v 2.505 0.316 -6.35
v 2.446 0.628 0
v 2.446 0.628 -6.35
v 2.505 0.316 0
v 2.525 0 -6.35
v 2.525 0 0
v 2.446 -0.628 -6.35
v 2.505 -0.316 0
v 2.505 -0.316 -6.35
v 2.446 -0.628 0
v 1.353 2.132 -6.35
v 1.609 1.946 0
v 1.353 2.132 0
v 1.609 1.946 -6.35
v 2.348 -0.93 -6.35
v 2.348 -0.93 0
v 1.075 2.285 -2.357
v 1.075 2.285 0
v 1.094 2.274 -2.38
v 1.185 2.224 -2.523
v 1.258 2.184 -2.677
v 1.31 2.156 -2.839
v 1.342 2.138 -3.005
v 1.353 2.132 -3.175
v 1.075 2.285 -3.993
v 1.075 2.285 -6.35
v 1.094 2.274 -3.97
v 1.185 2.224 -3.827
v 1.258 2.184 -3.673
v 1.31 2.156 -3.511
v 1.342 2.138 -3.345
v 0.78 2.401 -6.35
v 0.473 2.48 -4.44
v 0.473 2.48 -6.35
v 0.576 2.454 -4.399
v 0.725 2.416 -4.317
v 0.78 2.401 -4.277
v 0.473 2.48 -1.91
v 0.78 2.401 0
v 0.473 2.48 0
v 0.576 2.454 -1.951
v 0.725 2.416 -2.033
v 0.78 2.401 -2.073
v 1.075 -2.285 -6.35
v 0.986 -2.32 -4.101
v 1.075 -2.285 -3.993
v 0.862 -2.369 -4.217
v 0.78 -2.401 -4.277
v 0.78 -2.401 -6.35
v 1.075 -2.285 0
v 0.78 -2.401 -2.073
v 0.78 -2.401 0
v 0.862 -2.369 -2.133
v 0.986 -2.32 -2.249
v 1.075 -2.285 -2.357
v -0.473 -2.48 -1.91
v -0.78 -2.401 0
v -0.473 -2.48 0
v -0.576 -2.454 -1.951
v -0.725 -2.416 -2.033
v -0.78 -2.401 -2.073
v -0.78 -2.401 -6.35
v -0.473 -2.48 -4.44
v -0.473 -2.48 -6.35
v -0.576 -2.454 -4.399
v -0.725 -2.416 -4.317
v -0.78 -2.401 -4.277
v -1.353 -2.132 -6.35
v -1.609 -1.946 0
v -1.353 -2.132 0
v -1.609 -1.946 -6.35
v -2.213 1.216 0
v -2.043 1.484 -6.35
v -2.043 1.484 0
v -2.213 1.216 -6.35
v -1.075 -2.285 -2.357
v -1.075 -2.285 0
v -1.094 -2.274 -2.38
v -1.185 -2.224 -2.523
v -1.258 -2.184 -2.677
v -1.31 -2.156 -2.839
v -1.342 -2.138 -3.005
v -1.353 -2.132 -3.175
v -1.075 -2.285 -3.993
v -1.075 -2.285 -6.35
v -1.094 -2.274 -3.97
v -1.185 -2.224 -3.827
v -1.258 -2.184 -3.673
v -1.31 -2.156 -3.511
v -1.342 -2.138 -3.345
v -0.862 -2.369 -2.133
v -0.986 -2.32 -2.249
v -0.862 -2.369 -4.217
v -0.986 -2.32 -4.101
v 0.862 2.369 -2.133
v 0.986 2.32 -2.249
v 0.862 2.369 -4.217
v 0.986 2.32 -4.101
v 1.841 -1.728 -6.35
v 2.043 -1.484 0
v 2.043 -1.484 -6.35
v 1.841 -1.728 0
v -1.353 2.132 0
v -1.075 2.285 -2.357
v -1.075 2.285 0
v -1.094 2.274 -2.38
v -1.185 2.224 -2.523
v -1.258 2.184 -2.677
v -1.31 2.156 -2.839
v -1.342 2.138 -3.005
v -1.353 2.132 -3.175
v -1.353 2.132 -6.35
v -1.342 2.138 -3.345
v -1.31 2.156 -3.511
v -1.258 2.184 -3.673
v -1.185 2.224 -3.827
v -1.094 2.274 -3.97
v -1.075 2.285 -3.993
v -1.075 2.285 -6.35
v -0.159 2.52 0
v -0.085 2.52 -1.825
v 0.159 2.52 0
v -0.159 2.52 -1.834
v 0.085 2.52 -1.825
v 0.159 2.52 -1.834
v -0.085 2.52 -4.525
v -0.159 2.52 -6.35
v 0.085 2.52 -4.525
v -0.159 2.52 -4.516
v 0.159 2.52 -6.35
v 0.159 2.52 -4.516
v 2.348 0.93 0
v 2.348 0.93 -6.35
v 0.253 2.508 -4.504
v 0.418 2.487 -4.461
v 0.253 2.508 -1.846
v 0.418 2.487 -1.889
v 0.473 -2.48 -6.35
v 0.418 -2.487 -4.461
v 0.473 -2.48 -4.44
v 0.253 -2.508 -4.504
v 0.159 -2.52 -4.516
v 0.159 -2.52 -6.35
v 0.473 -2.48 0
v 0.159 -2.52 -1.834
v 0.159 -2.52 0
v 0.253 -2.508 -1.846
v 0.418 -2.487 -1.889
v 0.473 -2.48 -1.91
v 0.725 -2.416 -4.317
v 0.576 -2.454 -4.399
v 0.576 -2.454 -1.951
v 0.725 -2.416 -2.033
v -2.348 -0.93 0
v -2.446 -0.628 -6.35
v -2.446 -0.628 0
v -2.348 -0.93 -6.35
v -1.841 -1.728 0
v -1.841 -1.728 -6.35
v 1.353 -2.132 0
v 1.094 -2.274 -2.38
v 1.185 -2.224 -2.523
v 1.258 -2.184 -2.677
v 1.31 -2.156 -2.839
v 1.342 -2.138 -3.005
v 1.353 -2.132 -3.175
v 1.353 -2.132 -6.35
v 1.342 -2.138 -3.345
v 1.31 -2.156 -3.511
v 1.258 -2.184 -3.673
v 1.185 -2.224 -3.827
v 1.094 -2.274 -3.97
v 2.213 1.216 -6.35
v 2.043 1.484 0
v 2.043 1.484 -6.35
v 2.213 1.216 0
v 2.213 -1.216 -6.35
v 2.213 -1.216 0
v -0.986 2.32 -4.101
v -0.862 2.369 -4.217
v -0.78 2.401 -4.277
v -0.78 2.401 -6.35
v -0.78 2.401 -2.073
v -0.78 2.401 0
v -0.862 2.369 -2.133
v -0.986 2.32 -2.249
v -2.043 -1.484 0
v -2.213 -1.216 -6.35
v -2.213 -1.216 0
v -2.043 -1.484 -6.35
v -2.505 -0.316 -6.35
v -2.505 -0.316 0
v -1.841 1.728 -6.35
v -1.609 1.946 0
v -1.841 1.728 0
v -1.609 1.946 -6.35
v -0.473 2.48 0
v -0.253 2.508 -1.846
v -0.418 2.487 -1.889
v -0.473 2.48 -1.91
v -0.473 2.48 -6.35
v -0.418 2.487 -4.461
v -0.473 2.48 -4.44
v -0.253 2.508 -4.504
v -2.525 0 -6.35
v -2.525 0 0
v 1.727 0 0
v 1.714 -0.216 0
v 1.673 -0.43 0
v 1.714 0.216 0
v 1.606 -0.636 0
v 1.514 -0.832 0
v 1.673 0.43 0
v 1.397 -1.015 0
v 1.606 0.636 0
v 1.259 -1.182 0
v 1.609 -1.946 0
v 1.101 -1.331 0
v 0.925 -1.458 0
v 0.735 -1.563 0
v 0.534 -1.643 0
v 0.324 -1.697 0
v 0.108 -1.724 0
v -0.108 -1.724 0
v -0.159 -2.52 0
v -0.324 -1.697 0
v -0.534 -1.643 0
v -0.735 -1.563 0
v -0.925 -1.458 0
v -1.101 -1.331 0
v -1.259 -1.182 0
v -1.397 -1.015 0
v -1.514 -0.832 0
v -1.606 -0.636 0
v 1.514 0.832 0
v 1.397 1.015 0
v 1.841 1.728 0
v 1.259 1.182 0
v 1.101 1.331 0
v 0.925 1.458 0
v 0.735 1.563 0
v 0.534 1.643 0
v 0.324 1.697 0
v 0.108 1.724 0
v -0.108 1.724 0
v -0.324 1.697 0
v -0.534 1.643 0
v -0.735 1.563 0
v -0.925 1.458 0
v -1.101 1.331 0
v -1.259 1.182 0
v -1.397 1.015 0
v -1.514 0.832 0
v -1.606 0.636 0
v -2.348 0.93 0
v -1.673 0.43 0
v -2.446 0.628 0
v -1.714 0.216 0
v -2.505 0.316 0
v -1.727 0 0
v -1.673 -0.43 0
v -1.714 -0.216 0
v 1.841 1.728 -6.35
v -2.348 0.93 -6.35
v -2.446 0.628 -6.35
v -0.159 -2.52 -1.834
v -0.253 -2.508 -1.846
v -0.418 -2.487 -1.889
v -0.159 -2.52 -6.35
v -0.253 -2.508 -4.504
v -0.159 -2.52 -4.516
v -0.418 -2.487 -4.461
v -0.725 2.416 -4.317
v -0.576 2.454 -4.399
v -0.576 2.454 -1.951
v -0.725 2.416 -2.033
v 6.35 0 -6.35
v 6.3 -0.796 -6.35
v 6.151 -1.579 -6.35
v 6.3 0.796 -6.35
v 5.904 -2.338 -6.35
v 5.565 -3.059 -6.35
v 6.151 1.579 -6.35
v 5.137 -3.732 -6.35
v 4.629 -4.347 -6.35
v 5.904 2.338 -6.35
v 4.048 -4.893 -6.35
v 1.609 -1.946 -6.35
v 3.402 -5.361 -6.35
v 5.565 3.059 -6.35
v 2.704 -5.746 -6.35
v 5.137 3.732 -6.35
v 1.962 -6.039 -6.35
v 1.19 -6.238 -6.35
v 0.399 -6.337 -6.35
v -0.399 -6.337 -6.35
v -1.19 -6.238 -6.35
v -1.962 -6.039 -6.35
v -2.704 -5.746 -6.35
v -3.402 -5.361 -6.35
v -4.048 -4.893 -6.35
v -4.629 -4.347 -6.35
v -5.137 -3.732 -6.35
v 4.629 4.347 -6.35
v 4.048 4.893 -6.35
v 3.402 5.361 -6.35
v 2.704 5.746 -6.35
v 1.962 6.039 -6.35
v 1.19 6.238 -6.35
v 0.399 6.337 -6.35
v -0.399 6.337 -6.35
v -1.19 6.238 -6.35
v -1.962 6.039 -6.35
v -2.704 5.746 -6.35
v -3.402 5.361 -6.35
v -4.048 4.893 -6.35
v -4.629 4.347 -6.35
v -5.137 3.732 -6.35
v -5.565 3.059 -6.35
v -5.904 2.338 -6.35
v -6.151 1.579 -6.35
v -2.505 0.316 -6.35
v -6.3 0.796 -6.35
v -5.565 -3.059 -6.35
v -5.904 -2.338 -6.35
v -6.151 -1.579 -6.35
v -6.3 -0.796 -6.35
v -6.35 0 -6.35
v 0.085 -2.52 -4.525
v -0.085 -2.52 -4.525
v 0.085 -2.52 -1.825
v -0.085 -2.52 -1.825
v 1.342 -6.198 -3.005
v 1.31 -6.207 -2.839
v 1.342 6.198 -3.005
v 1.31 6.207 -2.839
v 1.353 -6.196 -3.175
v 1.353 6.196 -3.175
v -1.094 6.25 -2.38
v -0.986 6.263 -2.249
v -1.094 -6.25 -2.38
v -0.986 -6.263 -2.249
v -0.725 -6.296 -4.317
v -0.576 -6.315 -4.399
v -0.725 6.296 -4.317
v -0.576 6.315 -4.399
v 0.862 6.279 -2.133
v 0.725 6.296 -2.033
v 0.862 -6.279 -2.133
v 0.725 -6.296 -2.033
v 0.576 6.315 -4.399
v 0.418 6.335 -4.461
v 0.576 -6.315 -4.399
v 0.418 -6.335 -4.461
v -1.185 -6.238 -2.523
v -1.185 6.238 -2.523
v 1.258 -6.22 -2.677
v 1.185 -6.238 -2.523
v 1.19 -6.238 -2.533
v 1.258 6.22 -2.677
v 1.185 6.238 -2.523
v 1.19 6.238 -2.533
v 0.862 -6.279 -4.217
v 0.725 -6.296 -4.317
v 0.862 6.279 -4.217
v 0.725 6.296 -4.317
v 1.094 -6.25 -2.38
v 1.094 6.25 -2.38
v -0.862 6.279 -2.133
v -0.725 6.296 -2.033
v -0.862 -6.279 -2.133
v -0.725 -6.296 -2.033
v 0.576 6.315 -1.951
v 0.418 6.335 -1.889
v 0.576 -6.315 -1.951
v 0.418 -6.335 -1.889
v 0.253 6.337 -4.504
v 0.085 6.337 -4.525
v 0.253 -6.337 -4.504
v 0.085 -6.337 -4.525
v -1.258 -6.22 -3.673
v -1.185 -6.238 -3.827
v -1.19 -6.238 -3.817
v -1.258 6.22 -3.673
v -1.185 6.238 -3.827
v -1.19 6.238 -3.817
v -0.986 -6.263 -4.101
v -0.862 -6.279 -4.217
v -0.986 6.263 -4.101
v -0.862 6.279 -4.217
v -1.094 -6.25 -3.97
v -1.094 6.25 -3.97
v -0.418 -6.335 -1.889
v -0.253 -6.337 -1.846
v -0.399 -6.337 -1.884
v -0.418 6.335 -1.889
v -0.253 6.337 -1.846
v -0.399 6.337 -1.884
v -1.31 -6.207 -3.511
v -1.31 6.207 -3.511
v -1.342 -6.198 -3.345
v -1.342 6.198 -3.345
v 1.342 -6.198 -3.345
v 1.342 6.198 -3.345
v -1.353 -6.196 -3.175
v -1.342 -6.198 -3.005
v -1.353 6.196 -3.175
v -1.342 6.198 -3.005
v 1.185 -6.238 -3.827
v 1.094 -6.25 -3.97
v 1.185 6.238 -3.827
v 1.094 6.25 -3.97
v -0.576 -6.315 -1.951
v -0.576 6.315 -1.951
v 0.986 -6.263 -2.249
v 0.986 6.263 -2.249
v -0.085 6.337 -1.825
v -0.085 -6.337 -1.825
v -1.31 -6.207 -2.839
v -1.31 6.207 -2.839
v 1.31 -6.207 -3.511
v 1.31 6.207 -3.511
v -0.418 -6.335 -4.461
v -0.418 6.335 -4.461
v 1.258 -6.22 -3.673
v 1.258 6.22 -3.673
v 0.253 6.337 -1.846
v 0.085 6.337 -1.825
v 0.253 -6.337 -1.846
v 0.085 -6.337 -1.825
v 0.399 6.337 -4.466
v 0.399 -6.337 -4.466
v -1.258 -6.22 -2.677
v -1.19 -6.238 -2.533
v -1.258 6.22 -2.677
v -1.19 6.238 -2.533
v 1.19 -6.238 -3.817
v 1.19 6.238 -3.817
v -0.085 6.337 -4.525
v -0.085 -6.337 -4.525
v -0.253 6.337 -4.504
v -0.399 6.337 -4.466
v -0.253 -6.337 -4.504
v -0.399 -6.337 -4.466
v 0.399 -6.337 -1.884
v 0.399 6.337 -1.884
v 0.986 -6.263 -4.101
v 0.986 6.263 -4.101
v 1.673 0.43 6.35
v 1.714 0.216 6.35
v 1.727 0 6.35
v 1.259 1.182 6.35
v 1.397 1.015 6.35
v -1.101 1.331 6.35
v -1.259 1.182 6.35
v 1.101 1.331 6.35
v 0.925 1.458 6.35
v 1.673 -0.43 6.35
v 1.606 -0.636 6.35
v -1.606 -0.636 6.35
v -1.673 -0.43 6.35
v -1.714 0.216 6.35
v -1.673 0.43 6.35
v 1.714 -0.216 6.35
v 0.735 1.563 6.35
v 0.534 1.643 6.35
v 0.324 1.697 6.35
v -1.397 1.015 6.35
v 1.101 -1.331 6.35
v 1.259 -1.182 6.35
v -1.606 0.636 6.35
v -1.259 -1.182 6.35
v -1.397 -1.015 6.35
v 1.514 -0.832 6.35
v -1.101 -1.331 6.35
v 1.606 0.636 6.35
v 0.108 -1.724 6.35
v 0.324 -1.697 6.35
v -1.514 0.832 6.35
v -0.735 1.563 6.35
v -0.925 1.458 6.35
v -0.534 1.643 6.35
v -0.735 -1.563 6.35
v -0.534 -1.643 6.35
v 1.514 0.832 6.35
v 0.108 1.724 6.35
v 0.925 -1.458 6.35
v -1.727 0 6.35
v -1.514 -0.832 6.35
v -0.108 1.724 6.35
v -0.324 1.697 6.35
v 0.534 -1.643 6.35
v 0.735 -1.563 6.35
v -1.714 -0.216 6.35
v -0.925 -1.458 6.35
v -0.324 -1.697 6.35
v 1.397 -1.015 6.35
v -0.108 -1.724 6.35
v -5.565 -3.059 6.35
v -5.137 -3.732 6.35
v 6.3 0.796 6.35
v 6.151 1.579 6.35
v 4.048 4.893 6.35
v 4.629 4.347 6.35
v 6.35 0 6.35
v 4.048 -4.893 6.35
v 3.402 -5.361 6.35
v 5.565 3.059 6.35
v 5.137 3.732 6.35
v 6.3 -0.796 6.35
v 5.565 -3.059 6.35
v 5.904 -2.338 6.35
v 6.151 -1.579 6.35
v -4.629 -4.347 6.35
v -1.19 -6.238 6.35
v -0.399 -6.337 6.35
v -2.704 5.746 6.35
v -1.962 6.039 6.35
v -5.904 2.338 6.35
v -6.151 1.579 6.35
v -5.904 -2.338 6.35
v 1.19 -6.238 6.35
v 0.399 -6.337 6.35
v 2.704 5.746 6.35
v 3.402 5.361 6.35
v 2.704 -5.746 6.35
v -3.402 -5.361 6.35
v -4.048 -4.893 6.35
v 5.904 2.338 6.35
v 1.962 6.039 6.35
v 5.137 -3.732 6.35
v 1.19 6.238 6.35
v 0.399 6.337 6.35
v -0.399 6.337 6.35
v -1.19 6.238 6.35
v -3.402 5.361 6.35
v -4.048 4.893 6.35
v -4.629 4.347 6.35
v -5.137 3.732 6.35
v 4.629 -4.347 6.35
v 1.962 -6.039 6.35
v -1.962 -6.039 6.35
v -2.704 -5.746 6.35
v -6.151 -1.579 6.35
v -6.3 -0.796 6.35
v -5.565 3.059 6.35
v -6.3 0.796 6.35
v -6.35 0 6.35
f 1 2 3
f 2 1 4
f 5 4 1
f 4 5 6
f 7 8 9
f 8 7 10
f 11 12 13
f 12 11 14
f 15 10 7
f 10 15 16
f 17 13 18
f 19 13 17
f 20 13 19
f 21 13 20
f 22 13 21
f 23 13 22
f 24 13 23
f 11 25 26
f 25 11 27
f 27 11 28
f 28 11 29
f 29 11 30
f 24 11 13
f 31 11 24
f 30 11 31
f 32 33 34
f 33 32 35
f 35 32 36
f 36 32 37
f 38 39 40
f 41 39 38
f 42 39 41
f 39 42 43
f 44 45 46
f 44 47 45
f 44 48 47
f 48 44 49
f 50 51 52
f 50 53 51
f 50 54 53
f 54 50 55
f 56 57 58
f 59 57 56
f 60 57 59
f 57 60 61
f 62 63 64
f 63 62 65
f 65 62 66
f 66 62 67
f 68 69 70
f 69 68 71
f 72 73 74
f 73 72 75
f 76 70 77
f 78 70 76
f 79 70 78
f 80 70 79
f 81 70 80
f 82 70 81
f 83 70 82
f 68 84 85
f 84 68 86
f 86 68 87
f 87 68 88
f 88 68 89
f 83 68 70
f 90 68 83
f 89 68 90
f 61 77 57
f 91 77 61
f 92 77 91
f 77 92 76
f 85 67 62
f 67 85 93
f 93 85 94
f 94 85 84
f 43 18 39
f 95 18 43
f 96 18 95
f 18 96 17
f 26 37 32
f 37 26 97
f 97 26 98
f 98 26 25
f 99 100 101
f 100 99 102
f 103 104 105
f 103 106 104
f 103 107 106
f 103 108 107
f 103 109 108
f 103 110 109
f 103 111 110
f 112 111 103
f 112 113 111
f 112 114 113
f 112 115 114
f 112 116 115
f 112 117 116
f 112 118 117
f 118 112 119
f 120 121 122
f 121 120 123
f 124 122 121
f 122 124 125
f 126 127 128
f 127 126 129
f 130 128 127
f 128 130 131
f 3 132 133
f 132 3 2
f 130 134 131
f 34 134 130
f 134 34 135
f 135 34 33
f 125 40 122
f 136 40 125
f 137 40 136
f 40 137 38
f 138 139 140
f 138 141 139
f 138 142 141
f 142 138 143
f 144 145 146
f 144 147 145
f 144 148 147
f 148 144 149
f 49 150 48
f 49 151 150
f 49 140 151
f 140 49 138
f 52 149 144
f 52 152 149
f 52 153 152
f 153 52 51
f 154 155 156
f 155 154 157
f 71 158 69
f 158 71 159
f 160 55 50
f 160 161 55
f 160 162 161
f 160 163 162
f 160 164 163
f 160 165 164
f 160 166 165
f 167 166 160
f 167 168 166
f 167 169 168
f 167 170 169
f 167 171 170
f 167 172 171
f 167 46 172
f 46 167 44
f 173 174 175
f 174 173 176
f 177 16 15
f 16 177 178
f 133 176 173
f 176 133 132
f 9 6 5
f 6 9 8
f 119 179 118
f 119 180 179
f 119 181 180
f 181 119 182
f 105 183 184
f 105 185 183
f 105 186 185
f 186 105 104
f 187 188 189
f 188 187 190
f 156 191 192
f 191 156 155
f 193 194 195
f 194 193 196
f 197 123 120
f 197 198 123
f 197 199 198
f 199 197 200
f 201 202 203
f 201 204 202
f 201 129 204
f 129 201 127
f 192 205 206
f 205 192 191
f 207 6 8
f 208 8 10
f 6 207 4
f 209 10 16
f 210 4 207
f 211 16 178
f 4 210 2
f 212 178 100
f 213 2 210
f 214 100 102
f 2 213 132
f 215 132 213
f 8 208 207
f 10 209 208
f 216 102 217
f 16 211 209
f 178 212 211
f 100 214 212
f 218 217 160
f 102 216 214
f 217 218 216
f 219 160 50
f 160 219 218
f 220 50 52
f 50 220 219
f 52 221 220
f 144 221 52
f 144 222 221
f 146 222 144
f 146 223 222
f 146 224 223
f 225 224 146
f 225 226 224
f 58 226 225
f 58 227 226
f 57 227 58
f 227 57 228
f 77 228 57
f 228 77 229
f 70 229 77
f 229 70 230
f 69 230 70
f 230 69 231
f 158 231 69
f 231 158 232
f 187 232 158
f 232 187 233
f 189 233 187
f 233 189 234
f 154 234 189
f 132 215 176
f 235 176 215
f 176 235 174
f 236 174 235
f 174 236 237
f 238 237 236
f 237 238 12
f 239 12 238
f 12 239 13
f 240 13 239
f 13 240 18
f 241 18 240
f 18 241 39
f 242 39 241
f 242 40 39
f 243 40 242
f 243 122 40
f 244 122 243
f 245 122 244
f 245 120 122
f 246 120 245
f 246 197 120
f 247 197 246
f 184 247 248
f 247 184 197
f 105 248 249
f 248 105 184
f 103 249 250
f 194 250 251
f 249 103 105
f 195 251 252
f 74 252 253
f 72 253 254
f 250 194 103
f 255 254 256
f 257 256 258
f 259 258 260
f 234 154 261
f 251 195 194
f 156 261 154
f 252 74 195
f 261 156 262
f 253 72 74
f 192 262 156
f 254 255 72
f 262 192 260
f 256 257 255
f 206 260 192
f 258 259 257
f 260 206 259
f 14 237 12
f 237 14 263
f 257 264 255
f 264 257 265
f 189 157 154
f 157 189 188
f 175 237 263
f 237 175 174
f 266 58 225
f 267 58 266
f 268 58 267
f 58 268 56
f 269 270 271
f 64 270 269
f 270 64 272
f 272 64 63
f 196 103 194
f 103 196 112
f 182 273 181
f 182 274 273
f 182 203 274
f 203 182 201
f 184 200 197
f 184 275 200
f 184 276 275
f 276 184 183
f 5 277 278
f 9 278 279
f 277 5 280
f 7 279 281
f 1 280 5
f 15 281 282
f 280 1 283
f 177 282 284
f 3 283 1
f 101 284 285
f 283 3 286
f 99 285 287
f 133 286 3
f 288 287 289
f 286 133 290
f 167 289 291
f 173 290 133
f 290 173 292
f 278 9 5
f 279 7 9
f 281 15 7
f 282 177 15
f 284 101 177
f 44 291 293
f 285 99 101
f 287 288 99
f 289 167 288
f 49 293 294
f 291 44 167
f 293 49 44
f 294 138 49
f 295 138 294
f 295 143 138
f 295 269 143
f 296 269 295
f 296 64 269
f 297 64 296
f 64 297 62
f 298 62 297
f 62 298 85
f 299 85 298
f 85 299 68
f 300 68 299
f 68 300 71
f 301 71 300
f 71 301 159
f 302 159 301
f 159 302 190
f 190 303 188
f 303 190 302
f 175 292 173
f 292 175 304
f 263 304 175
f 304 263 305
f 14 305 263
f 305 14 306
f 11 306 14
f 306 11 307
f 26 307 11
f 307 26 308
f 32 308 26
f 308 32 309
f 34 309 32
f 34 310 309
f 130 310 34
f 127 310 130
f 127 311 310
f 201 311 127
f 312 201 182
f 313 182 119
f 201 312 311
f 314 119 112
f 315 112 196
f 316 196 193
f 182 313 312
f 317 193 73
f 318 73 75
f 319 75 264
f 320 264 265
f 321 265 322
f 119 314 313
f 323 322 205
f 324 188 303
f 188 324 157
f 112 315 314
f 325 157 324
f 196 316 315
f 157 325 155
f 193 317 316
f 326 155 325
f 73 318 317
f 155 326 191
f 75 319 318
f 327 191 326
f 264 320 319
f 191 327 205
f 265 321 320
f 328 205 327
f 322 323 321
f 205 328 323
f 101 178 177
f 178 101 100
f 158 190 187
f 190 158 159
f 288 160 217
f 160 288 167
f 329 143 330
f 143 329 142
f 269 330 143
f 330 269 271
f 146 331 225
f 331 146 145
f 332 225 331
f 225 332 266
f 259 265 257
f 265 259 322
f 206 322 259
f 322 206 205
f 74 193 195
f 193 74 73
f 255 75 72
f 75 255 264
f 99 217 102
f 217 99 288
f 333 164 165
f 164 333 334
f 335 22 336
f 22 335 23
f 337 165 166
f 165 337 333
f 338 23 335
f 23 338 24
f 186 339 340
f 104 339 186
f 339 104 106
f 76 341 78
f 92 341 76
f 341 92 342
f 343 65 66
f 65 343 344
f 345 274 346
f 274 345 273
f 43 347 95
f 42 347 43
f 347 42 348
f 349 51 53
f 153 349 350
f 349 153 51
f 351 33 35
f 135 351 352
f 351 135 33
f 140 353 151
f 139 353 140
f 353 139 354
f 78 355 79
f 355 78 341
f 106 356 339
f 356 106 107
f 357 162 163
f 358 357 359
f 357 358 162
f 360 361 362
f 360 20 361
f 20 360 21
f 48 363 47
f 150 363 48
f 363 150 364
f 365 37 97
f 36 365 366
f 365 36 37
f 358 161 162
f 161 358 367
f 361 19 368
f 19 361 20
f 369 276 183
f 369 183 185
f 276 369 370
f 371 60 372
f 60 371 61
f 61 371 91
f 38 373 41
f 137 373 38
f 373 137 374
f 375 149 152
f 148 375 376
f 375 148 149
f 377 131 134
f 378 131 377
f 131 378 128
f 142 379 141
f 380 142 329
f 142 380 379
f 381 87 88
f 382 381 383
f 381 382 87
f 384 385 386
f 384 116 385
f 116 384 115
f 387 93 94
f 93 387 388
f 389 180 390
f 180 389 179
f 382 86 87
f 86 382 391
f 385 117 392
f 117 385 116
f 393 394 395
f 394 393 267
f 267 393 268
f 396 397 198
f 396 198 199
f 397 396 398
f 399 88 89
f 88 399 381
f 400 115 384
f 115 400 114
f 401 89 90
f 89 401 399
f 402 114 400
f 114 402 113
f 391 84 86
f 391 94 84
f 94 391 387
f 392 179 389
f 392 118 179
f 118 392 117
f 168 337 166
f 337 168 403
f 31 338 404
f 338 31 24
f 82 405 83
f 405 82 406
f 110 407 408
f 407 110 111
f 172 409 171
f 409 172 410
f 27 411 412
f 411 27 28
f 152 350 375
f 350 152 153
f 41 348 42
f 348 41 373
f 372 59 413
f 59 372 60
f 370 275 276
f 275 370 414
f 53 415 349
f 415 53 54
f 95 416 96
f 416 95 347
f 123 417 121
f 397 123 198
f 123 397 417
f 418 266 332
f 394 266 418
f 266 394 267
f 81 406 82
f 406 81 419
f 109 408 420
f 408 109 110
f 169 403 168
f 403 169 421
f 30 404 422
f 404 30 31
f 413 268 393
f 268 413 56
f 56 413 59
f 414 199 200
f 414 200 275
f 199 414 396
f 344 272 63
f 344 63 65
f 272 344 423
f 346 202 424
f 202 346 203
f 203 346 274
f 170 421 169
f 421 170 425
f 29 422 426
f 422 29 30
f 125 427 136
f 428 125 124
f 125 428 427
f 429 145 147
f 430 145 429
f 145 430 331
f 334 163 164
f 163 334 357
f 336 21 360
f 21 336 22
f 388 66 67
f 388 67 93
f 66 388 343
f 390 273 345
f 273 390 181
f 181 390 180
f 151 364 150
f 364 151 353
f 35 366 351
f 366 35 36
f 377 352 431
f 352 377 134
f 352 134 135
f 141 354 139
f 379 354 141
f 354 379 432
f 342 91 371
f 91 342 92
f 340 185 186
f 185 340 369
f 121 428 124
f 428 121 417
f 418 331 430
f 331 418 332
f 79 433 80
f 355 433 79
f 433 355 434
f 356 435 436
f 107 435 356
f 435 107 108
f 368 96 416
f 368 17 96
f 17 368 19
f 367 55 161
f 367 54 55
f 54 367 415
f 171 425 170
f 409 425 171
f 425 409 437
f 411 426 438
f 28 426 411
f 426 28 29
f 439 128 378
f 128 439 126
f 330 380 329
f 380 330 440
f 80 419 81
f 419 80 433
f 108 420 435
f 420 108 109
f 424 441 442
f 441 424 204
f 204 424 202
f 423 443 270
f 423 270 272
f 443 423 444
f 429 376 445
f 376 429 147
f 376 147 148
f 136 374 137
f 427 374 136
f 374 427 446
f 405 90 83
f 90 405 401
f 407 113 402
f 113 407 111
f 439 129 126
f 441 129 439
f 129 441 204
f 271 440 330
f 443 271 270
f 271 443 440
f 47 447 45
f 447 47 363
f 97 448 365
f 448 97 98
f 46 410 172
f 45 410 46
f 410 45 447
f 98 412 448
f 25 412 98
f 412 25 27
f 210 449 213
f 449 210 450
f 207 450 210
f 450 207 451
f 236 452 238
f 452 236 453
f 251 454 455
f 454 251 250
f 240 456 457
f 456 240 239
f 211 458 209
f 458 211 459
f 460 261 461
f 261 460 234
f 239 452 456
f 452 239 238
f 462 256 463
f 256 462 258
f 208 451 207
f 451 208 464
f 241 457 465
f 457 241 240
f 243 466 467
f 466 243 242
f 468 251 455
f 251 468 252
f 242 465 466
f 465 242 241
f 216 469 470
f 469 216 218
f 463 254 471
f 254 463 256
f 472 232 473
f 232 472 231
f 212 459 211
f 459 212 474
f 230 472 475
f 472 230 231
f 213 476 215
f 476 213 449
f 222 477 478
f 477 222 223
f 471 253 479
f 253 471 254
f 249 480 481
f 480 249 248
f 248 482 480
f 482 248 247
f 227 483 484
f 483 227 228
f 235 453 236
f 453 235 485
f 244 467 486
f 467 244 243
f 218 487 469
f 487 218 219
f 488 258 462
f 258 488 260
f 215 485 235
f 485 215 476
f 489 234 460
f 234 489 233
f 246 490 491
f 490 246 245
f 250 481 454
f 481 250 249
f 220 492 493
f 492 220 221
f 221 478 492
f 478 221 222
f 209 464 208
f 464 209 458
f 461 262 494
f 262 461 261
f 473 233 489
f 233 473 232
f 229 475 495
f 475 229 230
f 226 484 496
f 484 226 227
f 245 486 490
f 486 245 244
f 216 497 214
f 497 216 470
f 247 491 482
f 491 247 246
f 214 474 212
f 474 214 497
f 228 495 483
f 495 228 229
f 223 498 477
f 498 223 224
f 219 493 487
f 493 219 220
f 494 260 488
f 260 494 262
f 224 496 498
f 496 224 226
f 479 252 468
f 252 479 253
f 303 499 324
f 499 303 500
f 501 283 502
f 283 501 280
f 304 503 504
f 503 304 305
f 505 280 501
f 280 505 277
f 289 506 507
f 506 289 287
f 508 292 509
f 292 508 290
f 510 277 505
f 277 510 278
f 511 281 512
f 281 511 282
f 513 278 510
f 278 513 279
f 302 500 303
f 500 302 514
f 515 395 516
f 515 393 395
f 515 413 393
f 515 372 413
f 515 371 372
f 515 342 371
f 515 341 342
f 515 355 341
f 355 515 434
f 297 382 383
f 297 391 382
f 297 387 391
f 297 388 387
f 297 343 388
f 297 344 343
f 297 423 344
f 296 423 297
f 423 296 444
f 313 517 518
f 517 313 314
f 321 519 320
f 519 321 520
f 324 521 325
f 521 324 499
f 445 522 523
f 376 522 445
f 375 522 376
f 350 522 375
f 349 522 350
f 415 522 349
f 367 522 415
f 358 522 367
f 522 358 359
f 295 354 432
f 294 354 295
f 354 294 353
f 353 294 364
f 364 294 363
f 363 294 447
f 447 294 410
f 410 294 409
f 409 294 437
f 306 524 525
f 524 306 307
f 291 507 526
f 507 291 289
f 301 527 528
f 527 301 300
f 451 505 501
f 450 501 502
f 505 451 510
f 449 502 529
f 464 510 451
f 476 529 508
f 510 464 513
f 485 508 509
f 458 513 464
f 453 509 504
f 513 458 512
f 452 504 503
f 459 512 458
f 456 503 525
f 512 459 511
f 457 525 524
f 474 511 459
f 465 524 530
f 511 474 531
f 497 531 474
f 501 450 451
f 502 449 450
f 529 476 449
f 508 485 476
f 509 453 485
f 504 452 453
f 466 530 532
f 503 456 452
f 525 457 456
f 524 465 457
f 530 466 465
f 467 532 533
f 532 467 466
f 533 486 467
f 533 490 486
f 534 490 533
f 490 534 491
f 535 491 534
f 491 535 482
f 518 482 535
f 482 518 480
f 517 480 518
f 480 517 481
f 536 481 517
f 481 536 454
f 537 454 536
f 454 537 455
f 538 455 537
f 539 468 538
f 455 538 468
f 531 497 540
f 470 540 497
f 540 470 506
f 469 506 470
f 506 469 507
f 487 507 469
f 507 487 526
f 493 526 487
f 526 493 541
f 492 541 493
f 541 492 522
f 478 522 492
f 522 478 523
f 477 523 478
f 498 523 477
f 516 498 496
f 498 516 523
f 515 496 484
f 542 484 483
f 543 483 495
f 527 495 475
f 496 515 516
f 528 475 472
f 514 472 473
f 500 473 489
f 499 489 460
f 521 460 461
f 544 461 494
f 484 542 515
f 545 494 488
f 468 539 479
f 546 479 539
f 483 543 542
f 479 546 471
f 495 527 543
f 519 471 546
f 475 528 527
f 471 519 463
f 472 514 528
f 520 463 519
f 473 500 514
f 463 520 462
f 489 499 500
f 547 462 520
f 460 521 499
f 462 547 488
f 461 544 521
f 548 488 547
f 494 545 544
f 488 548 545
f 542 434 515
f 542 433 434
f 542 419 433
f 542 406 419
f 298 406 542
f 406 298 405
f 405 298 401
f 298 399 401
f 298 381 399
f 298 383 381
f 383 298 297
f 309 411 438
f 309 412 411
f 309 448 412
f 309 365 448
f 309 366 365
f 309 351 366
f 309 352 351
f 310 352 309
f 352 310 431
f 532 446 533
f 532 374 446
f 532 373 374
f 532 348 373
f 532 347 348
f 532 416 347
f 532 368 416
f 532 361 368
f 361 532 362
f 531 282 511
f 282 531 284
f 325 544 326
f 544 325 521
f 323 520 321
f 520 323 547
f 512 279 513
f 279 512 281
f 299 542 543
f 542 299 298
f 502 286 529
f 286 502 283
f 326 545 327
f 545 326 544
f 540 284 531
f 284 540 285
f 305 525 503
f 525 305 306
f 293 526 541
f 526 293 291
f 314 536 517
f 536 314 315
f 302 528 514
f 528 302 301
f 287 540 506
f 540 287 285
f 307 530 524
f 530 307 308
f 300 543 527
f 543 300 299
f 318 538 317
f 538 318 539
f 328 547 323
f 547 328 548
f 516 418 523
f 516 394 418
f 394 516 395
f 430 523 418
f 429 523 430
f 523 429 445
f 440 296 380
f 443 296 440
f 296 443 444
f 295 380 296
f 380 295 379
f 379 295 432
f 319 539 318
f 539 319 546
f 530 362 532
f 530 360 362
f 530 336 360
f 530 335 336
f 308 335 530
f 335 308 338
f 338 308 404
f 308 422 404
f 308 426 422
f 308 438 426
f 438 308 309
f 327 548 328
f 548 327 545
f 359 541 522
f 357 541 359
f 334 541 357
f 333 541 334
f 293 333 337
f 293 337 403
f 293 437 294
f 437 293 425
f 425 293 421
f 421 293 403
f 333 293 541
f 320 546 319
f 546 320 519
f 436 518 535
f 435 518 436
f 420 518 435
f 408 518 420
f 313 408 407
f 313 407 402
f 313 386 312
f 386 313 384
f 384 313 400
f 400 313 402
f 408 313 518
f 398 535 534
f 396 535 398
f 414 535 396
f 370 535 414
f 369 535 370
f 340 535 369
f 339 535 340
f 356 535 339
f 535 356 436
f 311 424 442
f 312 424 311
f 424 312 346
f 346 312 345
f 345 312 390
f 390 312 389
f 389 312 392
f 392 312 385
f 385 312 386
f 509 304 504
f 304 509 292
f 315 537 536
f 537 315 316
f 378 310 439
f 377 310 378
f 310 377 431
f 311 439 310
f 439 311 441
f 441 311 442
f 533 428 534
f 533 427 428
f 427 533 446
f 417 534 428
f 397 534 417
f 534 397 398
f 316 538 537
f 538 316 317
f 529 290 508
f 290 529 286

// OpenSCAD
// attach 5 mm shaft to 8-32 threaded components
// also include hole for attaching spoke or similar
$fn=50;
inch = 25.4;

mt = 0.5*inch;
d = 0.5*inch;
d_s6 = 0.1065*inch;  // size 6 screw hole (before threading)
d_s8 = 0.1360*inch;  // size 8 screw hole (for mating with fasteners)
d_shaft = 5.05; // shaft hole diameter

module base() {
    linear_extrude(mt, center=true)
    circle(d=d, center=true);        
}

// translate([(0.3 + 1.24)/2 * inch, 0])
difference(){
    base();
    union(){
        // stepper shaft
        translate([0, 0, -mt/2])
        cylinder(h=0.25*inch, d=5.05);
        // stepper shaft fastener
        translate([0, 0, -mt/4])
        rotate([90, 0, 0])
        cylinder(h=0.5*inch, d=d_s6, center=true);
        // spoke hole
        // NOT NEEDED: just attach string to shaft fastener screw
        // 8-32 hole
        cylinder(h=0.5*inch, d=d_s8);
    }
}
